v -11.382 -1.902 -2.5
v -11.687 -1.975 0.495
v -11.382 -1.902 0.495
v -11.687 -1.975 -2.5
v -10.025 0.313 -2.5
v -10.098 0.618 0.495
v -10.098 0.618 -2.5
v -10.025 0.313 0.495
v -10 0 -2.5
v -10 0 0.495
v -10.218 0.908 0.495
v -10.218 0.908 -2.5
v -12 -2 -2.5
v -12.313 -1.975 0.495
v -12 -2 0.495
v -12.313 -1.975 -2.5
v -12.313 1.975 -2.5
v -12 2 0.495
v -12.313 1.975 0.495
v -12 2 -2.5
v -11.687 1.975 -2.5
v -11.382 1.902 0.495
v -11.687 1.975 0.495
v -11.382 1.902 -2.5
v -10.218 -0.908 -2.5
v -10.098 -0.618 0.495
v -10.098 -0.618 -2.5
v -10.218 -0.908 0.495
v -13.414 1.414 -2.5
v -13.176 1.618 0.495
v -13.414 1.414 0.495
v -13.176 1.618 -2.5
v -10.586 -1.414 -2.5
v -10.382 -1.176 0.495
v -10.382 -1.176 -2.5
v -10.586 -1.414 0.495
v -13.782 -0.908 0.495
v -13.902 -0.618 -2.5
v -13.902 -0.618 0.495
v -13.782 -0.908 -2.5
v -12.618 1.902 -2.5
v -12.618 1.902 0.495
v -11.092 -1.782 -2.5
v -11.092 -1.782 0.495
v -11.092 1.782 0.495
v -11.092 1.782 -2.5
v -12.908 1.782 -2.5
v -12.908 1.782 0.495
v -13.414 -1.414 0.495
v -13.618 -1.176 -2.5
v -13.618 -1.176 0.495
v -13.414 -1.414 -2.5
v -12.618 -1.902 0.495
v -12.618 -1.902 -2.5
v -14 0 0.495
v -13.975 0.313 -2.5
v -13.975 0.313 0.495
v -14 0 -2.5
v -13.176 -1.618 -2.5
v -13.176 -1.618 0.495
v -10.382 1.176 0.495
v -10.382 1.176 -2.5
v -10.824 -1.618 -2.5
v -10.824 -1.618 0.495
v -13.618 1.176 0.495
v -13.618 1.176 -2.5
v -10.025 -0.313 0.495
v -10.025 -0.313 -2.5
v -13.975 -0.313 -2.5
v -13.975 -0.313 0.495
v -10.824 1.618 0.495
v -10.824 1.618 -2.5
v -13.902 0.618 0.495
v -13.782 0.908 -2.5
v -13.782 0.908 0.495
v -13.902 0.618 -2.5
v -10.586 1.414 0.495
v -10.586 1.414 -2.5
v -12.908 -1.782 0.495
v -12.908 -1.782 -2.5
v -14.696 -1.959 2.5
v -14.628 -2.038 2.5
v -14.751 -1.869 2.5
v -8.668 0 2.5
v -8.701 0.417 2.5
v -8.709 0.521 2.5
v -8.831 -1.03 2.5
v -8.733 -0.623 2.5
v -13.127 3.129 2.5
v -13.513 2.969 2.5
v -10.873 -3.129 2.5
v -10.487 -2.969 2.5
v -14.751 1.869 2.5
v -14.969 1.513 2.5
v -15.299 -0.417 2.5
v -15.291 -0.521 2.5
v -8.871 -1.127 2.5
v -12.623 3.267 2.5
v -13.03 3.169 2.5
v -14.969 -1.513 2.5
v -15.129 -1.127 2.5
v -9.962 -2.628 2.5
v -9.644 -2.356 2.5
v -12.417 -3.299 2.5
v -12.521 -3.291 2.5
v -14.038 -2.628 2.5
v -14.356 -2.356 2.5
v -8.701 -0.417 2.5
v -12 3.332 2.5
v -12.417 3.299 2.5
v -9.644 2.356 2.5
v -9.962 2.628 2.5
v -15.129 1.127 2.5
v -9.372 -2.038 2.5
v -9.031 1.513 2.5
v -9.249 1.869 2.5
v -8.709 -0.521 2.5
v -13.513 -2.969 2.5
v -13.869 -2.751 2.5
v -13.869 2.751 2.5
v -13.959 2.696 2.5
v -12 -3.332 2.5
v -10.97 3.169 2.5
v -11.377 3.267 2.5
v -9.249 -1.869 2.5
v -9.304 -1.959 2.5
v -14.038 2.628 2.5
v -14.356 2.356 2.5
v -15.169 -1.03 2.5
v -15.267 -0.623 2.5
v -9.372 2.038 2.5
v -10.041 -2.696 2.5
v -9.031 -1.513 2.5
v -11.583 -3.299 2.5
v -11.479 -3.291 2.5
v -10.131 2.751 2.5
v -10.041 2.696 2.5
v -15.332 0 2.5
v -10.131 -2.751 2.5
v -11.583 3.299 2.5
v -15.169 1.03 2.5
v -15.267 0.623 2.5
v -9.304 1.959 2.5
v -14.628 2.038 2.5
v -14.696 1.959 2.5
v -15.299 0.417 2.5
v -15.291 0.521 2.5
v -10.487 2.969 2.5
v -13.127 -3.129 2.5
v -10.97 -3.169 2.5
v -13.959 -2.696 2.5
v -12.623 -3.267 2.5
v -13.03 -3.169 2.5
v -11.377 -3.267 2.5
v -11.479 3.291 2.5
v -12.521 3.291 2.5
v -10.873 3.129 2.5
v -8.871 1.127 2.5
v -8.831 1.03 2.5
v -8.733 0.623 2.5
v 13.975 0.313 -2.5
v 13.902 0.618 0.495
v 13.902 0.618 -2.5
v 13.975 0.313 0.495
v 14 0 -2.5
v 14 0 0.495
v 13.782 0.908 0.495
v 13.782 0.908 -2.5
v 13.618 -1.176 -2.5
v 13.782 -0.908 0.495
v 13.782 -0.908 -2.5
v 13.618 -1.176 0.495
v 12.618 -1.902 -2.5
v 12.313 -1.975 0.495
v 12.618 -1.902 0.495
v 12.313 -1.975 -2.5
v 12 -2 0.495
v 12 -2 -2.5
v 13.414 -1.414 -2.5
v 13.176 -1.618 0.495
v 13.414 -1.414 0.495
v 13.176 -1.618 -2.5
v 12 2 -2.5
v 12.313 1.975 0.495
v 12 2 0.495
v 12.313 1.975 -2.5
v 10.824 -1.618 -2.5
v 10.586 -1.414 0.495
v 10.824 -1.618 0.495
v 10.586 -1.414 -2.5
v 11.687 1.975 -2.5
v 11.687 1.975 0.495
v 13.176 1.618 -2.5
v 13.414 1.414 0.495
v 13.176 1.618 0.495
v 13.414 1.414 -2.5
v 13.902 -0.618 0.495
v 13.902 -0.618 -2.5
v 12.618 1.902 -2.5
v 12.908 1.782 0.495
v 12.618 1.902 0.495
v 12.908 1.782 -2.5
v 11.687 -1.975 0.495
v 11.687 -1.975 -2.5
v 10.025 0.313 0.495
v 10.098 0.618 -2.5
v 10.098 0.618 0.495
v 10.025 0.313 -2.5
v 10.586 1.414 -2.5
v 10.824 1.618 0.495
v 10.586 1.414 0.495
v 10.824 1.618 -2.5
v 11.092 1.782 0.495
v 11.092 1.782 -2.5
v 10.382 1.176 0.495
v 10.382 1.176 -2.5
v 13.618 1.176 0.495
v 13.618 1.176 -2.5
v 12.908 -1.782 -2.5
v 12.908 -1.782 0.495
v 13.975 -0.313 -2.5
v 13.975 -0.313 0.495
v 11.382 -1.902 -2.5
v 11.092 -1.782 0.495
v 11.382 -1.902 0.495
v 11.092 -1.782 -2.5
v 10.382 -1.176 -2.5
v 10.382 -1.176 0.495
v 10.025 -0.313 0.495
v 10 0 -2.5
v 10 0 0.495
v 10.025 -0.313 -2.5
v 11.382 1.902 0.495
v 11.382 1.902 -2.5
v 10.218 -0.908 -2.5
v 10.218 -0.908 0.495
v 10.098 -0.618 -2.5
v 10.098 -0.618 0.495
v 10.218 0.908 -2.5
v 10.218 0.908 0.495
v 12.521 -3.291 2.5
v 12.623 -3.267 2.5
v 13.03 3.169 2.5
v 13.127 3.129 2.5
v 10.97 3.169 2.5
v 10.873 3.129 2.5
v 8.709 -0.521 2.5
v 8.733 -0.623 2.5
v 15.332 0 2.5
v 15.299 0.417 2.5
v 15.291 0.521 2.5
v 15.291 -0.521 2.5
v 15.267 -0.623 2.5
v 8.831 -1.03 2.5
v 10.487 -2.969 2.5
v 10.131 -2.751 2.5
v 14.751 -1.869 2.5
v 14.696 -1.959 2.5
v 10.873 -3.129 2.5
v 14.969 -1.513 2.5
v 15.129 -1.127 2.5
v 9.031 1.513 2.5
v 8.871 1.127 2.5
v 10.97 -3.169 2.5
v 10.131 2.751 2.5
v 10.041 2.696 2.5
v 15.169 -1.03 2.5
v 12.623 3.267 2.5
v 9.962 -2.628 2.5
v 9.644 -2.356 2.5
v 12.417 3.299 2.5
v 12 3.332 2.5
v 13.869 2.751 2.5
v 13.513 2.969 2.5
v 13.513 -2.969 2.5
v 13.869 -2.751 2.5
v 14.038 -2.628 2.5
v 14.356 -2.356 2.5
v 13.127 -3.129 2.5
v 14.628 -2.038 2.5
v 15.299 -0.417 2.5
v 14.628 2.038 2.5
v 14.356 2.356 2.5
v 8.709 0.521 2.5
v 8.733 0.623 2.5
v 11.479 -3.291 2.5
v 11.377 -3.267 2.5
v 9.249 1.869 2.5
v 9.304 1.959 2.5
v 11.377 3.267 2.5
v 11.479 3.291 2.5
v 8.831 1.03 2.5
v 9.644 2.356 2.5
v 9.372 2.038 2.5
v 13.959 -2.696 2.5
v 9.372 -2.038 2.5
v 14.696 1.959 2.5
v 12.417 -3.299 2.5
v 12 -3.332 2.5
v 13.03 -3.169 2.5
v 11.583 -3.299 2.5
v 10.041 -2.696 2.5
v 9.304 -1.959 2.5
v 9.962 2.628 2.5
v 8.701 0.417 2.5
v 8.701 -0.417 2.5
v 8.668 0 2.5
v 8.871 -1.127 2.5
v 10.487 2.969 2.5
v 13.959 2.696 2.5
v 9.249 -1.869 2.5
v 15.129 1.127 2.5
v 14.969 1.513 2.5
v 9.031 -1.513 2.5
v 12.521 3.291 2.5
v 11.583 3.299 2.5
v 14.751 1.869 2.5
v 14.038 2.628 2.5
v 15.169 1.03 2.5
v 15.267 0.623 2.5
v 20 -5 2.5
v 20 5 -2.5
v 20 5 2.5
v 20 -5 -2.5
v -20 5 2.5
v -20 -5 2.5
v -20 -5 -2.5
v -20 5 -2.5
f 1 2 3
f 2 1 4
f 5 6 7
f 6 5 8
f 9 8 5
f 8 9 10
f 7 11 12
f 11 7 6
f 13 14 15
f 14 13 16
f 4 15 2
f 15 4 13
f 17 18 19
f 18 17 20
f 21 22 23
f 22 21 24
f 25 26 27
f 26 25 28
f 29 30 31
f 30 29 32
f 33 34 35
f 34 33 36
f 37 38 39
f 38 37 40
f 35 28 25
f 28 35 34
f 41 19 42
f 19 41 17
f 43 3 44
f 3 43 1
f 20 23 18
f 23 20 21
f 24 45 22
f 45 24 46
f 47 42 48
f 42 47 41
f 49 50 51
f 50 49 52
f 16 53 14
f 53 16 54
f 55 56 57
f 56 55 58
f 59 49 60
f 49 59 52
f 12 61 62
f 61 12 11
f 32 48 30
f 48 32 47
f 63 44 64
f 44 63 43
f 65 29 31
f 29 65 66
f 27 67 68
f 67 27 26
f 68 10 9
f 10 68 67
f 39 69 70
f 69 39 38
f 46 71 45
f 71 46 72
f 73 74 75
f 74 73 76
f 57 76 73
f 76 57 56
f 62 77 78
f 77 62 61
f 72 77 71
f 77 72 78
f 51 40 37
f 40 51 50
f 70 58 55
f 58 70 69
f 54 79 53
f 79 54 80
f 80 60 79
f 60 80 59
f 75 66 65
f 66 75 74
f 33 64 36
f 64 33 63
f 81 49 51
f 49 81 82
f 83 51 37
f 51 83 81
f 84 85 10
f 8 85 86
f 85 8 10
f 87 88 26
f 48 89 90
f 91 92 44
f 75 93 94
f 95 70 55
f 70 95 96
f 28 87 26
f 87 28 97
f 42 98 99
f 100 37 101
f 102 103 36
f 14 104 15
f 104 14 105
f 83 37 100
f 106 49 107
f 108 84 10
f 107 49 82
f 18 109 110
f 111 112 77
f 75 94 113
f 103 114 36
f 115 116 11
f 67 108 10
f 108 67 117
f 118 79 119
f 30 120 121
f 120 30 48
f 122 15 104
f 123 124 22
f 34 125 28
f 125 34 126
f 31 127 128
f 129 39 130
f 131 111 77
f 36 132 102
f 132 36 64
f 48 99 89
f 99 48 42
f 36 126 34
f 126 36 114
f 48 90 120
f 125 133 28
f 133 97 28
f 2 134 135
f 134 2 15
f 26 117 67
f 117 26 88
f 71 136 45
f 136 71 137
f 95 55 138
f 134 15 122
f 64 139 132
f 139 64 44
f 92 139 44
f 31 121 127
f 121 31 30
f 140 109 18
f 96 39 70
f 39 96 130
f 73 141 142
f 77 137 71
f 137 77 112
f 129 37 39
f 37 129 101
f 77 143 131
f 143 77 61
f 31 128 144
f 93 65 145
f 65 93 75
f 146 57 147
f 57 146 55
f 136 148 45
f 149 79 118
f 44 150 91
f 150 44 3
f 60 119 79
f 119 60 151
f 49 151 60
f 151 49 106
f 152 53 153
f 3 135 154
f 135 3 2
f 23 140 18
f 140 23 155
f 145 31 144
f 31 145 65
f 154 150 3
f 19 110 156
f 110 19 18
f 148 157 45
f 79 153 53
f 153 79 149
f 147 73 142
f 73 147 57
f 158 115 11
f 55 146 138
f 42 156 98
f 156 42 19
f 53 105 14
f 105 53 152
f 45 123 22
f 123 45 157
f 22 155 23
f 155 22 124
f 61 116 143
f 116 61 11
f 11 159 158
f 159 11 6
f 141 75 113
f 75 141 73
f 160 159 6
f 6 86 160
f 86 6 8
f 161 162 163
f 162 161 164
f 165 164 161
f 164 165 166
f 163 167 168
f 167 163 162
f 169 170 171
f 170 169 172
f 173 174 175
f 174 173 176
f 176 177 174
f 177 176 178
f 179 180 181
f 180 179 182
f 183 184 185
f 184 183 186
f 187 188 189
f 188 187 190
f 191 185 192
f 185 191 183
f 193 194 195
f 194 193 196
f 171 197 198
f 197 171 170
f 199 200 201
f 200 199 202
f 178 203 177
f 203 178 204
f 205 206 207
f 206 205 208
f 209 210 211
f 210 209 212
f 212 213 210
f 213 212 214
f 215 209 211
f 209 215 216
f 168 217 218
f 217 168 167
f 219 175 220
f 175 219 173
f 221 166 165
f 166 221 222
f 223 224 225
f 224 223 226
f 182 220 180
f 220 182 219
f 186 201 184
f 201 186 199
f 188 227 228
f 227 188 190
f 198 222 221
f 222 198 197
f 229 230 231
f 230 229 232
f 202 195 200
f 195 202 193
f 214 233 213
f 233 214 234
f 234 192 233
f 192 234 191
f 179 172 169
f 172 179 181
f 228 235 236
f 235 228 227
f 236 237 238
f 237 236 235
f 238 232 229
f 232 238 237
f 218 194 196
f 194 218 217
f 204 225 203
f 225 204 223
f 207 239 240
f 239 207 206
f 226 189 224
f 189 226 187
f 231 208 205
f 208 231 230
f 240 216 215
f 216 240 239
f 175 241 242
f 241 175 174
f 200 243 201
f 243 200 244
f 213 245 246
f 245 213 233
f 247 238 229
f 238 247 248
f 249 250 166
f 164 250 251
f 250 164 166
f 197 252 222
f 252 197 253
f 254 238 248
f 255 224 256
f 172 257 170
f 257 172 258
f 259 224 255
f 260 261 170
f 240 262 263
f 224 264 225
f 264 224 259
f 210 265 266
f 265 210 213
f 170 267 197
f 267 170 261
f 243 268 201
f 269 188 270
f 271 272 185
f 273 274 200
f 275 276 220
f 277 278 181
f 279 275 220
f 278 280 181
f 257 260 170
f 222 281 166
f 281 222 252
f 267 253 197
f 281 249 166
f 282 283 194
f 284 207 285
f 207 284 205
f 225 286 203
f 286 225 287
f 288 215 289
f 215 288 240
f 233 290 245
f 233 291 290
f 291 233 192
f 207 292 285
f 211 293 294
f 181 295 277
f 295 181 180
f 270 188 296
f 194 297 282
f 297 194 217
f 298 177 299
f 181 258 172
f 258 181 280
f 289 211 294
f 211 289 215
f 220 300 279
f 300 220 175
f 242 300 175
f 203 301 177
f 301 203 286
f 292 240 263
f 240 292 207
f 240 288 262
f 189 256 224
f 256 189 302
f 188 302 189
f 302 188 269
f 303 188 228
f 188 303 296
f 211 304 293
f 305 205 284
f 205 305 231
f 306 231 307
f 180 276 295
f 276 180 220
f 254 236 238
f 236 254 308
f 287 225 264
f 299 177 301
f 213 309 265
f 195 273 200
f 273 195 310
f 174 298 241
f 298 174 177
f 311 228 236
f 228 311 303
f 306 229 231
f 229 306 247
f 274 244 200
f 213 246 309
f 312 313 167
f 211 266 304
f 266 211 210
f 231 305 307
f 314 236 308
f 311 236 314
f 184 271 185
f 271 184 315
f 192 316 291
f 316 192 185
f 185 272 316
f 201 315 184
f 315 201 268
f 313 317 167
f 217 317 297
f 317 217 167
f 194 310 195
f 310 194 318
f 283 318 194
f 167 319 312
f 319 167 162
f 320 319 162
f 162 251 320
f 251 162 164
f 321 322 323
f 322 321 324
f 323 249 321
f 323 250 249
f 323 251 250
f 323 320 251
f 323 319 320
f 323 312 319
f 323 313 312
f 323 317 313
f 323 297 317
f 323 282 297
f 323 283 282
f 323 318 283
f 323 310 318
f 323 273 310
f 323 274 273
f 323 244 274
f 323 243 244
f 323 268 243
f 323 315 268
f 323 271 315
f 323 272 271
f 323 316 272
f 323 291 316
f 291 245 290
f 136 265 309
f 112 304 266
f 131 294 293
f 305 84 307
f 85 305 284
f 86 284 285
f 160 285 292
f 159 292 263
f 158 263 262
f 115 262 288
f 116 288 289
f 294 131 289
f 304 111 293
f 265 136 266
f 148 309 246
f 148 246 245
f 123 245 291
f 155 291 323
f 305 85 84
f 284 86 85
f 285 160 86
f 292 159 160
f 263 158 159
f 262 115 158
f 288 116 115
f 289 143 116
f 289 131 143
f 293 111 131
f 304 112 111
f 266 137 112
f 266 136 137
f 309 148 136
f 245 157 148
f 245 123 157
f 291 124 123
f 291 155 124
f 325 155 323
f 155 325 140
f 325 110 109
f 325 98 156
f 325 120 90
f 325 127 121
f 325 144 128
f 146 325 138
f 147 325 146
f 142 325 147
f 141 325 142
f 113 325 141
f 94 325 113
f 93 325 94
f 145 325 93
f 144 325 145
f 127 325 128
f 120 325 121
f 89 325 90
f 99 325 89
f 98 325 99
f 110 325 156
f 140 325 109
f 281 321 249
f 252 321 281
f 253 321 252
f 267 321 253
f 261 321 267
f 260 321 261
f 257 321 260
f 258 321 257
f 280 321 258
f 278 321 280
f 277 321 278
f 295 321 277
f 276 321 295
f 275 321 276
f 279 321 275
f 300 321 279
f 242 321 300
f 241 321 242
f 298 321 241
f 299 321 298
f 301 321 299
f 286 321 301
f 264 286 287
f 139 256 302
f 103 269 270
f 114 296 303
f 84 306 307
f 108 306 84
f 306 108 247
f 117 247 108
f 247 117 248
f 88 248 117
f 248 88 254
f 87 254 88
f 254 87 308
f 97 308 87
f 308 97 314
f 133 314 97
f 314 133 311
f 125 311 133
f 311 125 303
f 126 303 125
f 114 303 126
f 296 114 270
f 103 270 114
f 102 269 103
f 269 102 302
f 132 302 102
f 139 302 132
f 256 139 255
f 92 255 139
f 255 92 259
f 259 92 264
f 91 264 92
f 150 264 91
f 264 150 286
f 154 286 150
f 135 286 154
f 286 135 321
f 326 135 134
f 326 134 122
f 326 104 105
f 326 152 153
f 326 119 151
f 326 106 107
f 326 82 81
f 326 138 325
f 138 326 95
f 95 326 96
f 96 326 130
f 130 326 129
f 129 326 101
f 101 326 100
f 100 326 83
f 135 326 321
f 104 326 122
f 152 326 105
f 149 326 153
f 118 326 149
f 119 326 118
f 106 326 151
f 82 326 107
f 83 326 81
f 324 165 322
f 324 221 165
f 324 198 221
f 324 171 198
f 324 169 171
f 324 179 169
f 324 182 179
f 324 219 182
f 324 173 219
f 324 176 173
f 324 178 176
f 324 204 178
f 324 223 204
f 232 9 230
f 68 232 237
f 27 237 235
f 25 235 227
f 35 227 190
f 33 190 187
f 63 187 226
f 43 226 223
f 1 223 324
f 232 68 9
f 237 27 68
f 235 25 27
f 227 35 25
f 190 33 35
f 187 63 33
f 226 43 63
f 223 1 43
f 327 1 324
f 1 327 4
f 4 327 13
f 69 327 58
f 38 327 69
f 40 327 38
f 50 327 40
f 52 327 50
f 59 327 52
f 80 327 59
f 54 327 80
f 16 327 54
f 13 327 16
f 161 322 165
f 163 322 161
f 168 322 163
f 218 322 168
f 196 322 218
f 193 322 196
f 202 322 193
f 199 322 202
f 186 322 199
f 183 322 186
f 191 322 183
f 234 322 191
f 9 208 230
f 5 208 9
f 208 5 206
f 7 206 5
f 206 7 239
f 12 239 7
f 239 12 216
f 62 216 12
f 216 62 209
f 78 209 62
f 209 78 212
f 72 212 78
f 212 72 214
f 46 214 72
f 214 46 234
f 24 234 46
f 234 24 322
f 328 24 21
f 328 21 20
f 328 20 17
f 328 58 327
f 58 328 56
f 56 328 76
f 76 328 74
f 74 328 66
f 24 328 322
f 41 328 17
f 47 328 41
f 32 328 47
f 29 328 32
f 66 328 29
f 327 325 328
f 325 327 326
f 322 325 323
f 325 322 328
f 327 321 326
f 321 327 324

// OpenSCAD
thick = 5.0;
width = 10.0;
length = 40.0;
hole_rad = 4.0/2;
cone_rad = 8.0/2;
cone_depth = 3.0;

$fn = 40;

difference(){
  cube(size=[length,width,thick], center=true);
  for (x=[-.6,.6]){
      translate([x*(length/2), 0, -.01])
        cylinder(r=hole_rad, h=thick+.05, center=true);
      translate([x*(length/2), 0, thick-cone_depth])
        cylinder(r=hole_rad, r2=cone_rad, h=cone_depth+.01, center=true);
  }
}
